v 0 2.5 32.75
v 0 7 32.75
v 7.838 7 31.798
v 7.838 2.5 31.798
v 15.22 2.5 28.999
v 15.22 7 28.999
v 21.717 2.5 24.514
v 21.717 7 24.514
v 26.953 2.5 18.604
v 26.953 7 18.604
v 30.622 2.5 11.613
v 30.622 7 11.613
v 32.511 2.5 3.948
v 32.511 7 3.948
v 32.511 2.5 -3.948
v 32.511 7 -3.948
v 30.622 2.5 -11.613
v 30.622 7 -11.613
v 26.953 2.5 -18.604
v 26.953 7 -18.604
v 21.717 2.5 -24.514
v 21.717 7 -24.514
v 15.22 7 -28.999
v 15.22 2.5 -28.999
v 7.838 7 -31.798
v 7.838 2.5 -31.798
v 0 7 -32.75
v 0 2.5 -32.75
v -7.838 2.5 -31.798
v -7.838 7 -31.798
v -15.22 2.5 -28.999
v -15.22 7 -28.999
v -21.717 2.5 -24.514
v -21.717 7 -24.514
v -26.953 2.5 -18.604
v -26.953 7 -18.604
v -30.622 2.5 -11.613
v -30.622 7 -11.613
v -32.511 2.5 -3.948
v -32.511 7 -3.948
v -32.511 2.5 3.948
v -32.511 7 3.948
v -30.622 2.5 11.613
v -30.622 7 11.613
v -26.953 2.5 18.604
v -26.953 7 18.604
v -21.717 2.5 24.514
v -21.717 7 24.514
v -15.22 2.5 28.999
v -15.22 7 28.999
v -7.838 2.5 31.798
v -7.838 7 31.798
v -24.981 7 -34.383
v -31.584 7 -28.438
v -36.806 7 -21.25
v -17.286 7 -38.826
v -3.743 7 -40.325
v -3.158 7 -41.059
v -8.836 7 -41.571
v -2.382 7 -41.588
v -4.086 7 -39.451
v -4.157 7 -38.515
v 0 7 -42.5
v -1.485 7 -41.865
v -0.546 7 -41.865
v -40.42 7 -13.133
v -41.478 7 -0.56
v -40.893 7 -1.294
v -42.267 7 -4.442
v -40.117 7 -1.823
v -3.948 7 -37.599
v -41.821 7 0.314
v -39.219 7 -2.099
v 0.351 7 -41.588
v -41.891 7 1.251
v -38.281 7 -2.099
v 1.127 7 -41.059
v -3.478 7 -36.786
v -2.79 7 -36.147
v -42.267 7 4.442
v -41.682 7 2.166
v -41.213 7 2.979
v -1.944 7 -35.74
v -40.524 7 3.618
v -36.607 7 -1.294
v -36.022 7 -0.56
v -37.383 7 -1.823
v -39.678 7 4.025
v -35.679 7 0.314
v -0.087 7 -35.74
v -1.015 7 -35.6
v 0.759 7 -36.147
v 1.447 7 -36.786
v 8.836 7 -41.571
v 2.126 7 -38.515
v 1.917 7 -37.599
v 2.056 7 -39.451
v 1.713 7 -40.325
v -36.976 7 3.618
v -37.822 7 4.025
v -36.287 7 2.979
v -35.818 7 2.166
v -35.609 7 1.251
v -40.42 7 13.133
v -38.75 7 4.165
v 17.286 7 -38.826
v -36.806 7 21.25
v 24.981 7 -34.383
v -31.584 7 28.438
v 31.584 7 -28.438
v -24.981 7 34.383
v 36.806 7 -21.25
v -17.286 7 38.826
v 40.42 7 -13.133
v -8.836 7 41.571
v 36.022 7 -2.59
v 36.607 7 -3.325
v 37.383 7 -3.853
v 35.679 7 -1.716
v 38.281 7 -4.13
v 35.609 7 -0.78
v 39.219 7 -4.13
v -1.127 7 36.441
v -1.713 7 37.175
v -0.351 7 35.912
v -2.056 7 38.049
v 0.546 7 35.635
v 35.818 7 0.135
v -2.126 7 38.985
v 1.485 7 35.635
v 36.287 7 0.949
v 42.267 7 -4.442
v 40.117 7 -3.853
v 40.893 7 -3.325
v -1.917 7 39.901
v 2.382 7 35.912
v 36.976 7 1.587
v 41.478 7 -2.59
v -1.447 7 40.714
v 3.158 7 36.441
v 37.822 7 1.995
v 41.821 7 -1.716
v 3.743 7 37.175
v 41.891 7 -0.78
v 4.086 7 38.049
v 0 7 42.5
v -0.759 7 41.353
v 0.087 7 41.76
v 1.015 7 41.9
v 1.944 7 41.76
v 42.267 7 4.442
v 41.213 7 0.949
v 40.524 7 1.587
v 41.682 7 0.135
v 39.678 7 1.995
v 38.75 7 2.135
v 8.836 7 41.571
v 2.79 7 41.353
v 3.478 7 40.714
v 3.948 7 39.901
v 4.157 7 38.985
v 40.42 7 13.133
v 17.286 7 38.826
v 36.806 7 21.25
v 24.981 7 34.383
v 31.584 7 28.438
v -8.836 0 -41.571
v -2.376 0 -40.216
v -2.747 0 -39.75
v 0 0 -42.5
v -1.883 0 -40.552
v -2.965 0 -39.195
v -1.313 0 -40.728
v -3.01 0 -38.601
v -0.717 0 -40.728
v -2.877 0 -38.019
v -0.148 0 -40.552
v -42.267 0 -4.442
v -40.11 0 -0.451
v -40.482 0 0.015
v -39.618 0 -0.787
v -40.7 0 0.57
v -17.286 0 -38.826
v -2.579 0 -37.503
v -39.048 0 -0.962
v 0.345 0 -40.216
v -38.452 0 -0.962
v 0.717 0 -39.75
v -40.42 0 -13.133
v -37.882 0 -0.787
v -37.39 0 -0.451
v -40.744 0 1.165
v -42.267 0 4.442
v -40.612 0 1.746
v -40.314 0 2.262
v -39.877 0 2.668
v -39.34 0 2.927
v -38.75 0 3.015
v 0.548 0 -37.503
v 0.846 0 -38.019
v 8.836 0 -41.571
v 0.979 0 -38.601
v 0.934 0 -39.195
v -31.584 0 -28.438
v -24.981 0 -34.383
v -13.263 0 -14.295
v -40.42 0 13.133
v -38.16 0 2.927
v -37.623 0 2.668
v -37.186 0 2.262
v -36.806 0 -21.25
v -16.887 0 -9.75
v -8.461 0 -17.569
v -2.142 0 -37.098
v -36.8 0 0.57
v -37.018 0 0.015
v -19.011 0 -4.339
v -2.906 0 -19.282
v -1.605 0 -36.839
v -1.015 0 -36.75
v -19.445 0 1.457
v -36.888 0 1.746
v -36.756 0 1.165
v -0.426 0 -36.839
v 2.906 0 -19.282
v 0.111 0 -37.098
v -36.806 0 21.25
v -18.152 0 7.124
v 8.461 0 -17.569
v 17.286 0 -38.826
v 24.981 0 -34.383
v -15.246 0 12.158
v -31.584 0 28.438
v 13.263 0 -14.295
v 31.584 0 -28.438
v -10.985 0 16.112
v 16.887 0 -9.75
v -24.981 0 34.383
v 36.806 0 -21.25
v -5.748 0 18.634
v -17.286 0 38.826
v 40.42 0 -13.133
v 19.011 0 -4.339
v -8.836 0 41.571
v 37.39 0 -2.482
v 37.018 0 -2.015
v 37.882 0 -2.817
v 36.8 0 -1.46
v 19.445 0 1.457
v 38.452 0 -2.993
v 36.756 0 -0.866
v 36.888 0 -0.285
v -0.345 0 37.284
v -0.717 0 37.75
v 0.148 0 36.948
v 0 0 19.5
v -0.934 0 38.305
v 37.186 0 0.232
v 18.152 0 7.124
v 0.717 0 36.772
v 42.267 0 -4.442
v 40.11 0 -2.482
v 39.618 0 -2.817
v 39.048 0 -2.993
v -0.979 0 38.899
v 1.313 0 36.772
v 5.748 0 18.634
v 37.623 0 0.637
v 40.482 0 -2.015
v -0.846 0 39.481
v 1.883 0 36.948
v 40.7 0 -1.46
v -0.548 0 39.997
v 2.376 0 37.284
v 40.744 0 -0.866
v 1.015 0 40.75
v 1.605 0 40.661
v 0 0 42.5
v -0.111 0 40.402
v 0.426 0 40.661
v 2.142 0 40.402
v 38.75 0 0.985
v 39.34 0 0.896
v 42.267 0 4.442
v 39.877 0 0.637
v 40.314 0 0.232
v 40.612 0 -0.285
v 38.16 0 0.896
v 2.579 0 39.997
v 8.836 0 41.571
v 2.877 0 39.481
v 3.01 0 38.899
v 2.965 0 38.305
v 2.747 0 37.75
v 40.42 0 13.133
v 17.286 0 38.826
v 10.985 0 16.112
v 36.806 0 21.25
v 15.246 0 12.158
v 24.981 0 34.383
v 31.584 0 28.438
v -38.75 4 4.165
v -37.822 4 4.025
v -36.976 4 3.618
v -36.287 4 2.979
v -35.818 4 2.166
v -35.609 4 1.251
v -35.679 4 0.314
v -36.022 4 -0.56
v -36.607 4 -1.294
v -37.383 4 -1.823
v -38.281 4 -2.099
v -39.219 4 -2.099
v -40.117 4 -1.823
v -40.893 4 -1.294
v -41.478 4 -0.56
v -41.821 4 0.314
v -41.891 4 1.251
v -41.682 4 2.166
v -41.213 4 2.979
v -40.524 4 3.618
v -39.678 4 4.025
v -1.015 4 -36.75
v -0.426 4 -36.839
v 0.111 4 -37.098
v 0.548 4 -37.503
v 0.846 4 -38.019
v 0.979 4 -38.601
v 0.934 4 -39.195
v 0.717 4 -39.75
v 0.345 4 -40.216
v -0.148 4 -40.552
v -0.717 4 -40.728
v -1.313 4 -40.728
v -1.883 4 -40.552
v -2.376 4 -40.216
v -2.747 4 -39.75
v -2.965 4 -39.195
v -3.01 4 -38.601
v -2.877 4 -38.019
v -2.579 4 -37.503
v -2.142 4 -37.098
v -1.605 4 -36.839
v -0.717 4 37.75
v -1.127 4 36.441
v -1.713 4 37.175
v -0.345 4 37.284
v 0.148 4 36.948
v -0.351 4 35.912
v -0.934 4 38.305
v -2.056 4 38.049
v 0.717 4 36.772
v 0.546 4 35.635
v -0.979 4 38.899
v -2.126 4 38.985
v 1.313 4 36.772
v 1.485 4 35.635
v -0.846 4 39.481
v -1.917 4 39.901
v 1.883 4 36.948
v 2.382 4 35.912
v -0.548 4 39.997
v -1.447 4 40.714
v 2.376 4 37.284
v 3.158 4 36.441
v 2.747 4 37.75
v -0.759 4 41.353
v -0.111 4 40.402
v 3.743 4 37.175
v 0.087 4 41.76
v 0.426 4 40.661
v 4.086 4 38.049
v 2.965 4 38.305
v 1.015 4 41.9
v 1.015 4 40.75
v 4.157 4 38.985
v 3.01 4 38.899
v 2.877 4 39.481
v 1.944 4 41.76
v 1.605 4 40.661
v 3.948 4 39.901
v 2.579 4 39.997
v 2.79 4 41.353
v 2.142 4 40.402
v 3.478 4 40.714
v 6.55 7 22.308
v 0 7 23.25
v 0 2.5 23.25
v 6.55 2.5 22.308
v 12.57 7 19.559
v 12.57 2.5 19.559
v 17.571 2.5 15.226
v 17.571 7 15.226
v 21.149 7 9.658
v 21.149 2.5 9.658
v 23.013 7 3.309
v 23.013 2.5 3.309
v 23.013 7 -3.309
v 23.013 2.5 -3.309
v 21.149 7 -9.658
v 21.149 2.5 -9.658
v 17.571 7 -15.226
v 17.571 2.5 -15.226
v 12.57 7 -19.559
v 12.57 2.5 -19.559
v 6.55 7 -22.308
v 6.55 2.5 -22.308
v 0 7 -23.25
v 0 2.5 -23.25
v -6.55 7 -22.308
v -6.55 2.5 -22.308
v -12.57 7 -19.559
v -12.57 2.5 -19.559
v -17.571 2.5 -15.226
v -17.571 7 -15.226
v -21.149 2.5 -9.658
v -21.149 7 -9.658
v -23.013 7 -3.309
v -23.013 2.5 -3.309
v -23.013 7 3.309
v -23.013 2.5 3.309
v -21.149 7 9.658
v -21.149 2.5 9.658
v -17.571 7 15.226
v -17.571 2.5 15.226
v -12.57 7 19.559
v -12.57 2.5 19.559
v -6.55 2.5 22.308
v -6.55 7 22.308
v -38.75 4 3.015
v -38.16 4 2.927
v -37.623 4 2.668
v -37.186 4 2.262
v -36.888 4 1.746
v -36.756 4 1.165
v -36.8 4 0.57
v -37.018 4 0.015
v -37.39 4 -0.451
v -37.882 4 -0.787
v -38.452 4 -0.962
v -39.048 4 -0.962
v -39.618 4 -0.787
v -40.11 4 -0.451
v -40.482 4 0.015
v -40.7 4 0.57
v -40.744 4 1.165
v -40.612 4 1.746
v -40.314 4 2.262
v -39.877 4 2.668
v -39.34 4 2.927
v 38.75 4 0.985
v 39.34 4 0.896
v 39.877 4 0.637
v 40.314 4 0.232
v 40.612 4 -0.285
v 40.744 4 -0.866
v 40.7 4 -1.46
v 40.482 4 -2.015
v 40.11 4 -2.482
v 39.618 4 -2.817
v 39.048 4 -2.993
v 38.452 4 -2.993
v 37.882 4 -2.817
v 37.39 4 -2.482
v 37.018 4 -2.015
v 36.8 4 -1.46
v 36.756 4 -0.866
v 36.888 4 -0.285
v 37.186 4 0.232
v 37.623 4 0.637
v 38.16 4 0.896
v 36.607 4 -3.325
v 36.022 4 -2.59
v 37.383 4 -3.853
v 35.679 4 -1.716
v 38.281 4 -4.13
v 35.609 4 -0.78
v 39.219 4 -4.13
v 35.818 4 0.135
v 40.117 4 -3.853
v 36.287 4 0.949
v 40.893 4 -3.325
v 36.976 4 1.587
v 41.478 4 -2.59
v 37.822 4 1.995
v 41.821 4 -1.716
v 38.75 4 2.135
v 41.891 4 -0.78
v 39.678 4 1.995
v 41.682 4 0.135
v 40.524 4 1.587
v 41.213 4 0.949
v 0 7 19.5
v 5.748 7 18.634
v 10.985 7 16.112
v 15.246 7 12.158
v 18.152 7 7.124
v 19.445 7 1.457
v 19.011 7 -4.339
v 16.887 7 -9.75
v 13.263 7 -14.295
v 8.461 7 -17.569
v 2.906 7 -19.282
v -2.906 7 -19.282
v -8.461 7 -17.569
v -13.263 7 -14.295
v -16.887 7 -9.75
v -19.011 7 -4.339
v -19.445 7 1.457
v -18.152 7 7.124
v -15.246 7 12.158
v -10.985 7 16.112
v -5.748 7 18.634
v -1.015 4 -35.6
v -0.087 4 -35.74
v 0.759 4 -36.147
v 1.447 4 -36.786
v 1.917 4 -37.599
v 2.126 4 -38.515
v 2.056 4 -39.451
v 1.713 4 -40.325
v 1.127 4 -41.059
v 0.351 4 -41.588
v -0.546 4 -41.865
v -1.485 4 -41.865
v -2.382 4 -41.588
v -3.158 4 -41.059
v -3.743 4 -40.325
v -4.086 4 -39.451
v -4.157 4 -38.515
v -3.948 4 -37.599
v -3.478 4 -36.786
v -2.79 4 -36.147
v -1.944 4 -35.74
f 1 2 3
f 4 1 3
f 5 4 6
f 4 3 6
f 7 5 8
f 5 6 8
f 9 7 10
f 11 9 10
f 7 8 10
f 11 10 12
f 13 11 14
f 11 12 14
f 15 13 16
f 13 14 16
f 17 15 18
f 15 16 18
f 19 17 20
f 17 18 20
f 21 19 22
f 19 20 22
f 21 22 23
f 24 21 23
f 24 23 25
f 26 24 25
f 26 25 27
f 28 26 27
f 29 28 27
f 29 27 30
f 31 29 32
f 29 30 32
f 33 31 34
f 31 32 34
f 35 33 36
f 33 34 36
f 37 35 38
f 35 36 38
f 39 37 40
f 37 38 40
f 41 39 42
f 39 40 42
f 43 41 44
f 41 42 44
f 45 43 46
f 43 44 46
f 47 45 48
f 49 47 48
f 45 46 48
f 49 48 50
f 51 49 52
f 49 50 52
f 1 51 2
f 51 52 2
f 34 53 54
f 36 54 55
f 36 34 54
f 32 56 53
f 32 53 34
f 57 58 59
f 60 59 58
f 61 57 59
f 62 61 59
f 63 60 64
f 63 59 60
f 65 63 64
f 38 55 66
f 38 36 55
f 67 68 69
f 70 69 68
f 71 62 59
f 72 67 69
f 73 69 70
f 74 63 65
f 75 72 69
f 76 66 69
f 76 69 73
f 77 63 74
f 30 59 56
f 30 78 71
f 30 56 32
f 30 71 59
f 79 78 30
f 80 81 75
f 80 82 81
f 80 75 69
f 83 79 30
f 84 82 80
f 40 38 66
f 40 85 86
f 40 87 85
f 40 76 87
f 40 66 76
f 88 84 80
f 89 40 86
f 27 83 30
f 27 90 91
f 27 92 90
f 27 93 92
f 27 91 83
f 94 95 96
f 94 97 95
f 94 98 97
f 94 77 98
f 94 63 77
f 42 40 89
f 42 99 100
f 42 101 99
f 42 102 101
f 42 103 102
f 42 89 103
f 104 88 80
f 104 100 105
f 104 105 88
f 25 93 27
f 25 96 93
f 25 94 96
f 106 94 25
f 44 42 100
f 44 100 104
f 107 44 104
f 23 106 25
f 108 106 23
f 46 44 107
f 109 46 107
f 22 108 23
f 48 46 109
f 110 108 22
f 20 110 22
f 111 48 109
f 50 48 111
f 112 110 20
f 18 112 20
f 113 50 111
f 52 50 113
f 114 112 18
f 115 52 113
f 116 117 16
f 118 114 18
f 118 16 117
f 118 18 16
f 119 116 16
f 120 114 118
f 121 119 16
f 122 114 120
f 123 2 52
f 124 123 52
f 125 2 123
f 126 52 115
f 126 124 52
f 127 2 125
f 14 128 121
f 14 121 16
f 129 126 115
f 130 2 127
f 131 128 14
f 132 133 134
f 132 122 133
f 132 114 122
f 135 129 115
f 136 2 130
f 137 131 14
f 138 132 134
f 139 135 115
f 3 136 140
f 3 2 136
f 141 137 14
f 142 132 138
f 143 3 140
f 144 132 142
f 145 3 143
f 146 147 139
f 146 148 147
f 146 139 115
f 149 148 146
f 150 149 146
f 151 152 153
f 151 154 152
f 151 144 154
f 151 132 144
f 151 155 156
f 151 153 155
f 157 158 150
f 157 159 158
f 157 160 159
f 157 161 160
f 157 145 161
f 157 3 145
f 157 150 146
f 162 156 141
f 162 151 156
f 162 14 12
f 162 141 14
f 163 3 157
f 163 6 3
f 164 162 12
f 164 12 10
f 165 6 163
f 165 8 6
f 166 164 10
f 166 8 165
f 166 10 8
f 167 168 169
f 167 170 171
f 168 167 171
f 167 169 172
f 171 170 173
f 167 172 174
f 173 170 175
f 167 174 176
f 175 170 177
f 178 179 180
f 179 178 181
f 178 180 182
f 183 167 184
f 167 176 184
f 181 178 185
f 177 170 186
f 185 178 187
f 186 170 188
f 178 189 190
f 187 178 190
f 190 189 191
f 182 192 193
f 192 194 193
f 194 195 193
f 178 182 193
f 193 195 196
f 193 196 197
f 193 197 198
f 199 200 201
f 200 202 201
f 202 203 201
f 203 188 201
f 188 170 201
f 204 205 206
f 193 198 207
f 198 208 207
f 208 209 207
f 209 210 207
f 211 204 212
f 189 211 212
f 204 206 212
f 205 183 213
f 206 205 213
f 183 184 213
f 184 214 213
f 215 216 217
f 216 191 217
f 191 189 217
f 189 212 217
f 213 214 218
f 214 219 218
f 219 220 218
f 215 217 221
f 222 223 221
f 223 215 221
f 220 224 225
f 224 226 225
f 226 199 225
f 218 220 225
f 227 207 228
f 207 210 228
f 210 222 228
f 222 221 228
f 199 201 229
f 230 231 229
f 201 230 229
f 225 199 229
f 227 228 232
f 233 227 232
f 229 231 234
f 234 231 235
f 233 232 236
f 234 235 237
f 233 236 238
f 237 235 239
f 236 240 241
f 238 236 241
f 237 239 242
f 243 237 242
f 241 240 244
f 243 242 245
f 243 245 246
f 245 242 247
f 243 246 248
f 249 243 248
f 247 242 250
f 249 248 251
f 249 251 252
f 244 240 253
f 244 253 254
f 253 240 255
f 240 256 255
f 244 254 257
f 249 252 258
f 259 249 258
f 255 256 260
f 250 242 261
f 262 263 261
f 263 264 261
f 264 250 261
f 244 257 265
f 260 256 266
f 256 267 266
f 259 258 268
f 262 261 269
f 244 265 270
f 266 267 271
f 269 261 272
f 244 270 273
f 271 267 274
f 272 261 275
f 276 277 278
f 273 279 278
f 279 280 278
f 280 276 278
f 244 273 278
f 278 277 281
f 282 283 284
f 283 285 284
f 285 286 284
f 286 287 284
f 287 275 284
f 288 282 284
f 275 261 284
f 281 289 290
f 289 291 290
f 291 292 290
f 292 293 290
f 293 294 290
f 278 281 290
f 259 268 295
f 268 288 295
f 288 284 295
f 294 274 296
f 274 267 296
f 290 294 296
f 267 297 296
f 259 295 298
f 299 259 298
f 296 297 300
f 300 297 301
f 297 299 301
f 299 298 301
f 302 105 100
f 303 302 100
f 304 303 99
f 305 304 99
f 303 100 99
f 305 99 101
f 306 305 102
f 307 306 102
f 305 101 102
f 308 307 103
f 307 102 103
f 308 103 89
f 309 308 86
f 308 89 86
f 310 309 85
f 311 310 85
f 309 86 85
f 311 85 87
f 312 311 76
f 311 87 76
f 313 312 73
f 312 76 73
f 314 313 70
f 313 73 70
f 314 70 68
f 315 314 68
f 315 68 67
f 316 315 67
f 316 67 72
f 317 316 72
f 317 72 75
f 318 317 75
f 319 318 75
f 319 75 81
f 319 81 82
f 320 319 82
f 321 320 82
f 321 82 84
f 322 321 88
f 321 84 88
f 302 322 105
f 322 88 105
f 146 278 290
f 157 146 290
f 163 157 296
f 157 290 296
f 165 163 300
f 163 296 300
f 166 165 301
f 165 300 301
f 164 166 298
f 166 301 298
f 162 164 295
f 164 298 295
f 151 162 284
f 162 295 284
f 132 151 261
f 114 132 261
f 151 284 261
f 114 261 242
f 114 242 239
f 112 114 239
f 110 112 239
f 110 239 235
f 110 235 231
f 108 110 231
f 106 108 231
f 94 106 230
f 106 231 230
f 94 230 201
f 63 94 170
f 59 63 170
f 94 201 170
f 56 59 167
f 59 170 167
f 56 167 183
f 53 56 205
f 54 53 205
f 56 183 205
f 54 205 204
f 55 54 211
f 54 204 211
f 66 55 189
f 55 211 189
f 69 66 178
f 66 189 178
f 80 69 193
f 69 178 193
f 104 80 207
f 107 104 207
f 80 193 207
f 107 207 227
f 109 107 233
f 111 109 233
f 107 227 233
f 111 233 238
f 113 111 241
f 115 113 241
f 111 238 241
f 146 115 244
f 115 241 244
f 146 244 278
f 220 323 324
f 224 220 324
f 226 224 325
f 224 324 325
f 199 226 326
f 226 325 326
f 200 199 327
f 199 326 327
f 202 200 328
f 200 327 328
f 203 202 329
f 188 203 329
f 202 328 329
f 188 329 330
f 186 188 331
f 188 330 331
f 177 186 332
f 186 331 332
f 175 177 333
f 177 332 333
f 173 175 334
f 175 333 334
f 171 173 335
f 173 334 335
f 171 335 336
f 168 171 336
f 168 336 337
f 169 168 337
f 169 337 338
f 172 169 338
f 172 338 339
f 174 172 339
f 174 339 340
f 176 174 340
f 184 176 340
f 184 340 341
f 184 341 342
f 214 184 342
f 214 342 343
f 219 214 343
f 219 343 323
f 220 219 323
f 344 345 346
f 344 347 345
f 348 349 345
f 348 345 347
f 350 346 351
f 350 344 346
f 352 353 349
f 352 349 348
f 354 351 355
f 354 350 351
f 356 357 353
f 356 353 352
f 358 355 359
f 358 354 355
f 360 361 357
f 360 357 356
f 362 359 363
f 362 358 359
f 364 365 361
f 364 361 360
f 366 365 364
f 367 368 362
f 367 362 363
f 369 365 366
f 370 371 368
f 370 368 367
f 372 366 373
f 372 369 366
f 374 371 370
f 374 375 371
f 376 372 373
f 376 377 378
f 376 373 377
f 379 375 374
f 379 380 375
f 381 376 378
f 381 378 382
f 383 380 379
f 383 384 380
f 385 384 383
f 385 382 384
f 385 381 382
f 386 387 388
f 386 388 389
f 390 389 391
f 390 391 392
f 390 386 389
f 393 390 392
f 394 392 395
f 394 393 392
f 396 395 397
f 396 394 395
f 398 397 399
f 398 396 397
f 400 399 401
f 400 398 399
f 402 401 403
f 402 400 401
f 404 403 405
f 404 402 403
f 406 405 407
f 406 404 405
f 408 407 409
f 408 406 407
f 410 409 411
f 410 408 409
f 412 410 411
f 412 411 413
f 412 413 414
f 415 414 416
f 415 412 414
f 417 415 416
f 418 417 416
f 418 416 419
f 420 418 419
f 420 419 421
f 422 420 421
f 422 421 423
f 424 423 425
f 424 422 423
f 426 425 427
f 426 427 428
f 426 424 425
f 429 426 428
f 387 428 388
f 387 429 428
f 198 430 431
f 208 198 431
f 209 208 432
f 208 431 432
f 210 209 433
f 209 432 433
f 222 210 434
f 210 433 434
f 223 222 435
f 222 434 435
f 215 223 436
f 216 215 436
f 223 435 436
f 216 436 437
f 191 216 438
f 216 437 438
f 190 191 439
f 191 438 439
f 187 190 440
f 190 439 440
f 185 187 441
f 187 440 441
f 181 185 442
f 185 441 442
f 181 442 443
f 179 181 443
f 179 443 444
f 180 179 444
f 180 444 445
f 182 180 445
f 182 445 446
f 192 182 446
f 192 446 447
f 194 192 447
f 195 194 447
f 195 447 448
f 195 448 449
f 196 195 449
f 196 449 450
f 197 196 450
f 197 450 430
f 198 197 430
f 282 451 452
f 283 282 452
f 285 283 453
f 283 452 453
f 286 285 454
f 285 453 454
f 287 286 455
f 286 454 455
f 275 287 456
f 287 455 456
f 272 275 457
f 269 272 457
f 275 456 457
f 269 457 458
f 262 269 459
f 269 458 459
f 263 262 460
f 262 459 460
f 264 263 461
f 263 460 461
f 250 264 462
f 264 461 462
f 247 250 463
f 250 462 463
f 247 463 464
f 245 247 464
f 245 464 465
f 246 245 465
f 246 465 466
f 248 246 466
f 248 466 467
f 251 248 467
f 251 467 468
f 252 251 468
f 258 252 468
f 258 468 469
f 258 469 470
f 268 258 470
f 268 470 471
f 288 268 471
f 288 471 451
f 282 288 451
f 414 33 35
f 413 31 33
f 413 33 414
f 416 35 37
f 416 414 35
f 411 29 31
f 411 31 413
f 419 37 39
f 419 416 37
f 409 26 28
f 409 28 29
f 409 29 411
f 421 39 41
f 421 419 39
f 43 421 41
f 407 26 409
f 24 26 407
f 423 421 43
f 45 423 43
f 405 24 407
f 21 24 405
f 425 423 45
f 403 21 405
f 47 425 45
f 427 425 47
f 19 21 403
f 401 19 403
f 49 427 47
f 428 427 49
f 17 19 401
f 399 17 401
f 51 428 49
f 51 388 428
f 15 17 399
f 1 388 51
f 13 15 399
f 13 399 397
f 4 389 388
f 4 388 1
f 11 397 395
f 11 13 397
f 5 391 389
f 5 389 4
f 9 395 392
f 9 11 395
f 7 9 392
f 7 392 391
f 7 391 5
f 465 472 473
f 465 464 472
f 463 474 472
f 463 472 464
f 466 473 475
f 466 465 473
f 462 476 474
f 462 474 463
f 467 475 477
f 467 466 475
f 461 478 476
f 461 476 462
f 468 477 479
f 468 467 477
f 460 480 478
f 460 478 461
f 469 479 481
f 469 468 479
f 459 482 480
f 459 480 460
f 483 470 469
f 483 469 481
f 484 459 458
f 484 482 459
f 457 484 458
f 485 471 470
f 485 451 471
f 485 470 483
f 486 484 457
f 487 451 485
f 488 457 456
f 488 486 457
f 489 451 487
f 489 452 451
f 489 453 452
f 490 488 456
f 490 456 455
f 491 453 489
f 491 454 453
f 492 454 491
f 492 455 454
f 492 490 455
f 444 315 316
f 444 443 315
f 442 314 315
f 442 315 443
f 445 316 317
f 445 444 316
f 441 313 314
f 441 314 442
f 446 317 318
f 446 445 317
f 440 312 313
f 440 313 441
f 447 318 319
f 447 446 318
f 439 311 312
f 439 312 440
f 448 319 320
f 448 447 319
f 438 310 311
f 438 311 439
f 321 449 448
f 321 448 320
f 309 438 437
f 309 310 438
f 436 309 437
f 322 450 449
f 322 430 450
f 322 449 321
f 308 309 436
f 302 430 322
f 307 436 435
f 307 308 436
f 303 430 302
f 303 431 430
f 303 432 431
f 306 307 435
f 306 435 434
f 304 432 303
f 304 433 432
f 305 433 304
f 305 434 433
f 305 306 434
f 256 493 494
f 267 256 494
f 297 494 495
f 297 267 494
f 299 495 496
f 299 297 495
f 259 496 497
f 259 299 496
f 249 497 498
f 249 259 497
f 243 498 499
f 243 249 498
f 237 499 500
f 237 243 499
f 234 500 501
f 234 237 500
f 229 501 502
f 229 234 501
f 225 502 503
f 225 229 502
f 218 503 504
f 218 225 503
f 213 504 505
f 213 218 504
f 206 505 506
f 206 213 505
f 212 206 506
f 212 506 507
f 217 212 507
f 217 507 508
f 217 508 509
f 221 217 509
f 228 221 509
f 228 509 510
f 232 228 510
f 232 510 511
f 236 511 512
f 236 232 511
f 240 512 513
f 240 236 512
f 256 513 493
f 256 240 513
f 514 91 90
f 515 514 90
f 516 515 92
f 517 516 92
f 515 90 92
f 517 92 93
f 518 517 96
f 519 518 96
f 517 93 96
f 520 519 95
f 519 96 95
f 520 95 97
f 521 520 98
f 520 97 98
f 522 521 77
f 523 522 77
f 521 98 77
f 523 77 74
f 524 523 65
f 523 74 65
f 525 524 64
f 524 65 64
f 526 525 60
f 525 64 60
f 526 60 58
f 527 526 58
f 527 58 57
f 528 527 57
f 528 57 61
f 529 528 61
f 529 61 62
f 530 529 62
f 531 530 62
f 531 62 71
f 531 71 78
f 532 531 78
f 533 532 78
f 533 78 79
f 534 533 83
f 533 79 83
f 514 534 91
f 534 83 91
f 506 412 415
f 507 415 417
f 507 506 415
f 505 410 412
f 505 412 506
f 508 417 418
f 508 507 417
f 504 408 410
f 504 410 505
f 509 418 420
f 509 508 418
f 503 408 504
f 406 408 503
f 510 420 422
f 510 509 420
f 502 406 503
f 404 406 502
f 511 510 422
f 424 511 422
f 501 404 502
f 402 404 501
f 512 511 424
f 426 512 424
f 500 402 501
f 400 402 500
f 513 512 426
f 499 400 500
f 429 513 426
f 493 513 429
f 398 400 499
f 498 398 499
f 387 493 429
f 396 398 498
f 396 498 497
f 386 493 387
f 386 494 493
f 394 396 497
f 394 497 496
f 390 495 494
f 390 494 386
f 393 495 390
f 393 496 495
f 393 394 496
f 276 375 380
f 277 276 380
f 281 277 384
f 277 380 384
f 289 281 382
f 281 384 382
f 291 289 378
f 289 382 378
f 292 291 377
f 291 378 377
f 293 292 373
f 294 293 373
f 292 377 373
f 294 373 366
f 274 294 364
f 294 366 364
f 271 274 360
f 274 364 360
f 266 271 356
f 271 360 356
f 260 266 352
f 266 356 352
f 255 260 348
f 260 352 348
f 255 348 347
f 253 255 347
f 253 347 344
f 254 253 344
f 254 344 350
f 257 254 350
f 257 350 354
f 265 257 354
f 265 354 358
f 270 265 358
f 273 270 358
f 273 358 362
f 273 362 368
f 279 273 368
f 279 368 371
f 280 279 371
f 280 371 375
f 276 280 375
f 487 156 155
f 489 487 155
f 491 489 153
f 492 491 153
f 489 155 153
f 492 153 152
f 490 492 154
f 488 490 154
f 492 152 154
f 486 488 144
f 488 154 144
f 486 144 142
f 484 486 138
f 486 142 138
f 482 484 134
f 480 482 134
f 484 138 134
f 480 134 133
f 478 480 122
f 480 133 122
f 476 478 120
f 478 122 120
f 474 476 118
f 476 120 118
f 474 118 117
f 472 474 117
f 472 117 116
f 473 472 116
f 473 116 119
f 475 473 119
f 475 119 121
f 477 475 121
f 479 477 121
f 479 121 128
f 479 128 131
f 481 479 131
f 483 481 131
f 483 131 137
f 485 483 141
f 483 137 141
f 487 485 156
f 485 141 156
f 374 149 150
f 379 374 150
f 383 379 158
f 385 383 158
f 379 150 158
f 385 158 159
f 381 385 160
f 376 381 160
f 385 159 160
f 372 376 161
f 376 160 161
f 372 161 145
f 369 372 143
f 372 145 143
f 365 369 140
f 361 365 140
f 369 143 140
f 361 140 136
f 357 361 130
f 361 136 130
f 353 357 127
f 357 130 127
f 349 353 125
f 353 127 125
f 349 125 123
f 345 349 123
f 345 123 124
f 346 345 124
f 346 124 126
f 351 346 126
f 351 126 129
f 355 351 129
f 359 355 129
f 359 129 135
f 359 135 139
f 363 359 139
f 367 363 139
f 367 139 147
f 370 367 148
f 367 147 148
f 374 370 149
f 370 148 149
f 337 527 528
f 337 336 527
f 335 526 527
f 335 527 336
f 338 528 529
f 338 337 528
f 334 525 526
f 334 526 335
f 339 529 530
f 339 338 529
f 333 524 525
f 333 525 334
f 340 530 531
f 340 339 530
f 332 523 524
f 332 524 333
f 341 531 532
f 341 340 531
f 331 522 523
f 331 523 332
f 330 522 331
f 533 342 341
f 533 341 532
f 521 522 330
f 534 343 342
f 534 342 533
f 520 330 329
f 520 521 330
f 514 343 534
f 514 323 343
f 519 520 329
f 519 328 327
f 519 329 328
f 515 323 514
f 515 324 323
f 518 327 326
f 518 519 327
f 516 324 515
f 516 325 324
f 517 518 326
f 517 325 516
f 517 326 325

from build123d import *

# Parameters (mm, degrees)
SKETCH1_R           = 42.5
SKETCH1_R_2         = 19.5
BOSS_EXTRUDE1_DEPTH = 7
SKETCH2_R           = 32.75
SKETCH2_R_2         = 23.25
CUT_EXTRUDE1_DEPTH  = 4.5
SKETCH3_R           = 2
CUT_EXTRUDE2_DEPTH  = 61.510329697
SKETCH4_R           = 3.15
SKETCH4_R_2         = 2
CUT_EXTRUDE3_DEPTH  = 3


with BuildPart() as part:
    # Sketch1 → Boss-Extrude1 (new body)
    with BuildSketch(Plane(origin=(0, 0, 0), x_dir=(1, 0, 0), z_dir=(0, 1, 0))):
        with Locations(Location((0, 0, 0), (0, 0, 270))):
            Circle(SKETCH1_R)
        with Locations(Location((0, 0, 0), (0, 0, 270))):
            Circle(SKETCH1_R_2, mode=Mode.SUBTRACT)
    extrude(amount=BOSS_EXTRUDE1_DEPTH)

    # Sketch2 → Cut-Extrude1 (cut)
    with BuildSketch(Plane(origin=(0, 7, 0), x_dir=(1, 0, 0), z_dir=(0, 1, 0))):
        with Locations(Location((0, 0, 0), (0, 0, 270))):
            Circle(SKETCH2_R)
        with Locations(Location((0, 0, 0), (0, 0, 270))):
            Circle(SKETCH2_R_2, mode=Mode.SUBTRACT)
    extrude(amount=-CUT_EXTRUDE1_DEPTH, mode=Mode.SUBTRACT)

    # Sketch3 → Cut-Extrude2 (cut, through all)
    with BuildSketch(Plane(origin=(0, 7, 0), x_dir=(1, 0, 0), z_dir=(0, 1, 0))):
        with Locations(Location((-38.75, -1.015406046, 0), (0, 0, 270))):
            Circle(SKETCH3_R)
        with Locations(Location((-1.015406046, 38.75, 0), (0, 0, 270))):
            Circle(SKETCH3_R)
        with Locations(Location((38.75, 1.015406046, 0), (0, 0, 270))):
            Circle(SKETCH3_R)
        with Locations(Location((1.015406046, -38.75, 0), (0, 0, 270))):
            Circle(SKETCH3_R)
    extrude(amount=-CUT_EXTRUDE2_DEPTH, mode=Mode.SUBTRACT)

    # Sketch4 → Cut-Extrude3 (cut)
    # profile 1 of 4: a face of its own
    with BuildSketch(Plane(origin=(0, 7, 0), x_dir=(1, 0, 0), z_dir=(0, 1, 0))):
        with Locations(Location((-1.015406046, 38.75, 0), (0, 0, 270))):
            Circle(SKETCH4_R)
        with Locations(Location((-1.015406046, 38.75, 0), (0, 0, 270))):
            Circle(SKETCH4_R_2, mode=Mode.SUBTRACT)
    # profile 2 of 4: a face of its own
    with BuildSketch(Plane(origin=(0, 7, 0), x_dir=(1, 0, 0), z_dir=(0, 1, 0))):
        with Locations(Location((38.75, 1.015406046, 0), (0, 0, 270))):
            Circle(SKETCH4_R)
    # profile 3 of 4: a face of its own
    with BuildSketch(Plane(origin=(0, 7, 0), x_dir=(1, 0, 0), z_dir=(0, 1, 0))):
        with Locations(Location((1.015406046, -38.75, 0), (0, 0, 270))):
            Circle(SKETCH4_R)
    # profile 4 of 4: a face of its own
    with BuildSketch(Plane(origin=(0, 7, 0), x_dir=(1, 0, 0), z_dir=(0, 1, 0))):
        with Locations(Location((-38.75, -1.015406046, 0), (0, 0, 270))):
            Circle(SKETCH4_R)
    extrude(amount=-CUT_EXTRUDE3_DEPTH, mode=Mode.SUBTRACT)


solid = part.part
